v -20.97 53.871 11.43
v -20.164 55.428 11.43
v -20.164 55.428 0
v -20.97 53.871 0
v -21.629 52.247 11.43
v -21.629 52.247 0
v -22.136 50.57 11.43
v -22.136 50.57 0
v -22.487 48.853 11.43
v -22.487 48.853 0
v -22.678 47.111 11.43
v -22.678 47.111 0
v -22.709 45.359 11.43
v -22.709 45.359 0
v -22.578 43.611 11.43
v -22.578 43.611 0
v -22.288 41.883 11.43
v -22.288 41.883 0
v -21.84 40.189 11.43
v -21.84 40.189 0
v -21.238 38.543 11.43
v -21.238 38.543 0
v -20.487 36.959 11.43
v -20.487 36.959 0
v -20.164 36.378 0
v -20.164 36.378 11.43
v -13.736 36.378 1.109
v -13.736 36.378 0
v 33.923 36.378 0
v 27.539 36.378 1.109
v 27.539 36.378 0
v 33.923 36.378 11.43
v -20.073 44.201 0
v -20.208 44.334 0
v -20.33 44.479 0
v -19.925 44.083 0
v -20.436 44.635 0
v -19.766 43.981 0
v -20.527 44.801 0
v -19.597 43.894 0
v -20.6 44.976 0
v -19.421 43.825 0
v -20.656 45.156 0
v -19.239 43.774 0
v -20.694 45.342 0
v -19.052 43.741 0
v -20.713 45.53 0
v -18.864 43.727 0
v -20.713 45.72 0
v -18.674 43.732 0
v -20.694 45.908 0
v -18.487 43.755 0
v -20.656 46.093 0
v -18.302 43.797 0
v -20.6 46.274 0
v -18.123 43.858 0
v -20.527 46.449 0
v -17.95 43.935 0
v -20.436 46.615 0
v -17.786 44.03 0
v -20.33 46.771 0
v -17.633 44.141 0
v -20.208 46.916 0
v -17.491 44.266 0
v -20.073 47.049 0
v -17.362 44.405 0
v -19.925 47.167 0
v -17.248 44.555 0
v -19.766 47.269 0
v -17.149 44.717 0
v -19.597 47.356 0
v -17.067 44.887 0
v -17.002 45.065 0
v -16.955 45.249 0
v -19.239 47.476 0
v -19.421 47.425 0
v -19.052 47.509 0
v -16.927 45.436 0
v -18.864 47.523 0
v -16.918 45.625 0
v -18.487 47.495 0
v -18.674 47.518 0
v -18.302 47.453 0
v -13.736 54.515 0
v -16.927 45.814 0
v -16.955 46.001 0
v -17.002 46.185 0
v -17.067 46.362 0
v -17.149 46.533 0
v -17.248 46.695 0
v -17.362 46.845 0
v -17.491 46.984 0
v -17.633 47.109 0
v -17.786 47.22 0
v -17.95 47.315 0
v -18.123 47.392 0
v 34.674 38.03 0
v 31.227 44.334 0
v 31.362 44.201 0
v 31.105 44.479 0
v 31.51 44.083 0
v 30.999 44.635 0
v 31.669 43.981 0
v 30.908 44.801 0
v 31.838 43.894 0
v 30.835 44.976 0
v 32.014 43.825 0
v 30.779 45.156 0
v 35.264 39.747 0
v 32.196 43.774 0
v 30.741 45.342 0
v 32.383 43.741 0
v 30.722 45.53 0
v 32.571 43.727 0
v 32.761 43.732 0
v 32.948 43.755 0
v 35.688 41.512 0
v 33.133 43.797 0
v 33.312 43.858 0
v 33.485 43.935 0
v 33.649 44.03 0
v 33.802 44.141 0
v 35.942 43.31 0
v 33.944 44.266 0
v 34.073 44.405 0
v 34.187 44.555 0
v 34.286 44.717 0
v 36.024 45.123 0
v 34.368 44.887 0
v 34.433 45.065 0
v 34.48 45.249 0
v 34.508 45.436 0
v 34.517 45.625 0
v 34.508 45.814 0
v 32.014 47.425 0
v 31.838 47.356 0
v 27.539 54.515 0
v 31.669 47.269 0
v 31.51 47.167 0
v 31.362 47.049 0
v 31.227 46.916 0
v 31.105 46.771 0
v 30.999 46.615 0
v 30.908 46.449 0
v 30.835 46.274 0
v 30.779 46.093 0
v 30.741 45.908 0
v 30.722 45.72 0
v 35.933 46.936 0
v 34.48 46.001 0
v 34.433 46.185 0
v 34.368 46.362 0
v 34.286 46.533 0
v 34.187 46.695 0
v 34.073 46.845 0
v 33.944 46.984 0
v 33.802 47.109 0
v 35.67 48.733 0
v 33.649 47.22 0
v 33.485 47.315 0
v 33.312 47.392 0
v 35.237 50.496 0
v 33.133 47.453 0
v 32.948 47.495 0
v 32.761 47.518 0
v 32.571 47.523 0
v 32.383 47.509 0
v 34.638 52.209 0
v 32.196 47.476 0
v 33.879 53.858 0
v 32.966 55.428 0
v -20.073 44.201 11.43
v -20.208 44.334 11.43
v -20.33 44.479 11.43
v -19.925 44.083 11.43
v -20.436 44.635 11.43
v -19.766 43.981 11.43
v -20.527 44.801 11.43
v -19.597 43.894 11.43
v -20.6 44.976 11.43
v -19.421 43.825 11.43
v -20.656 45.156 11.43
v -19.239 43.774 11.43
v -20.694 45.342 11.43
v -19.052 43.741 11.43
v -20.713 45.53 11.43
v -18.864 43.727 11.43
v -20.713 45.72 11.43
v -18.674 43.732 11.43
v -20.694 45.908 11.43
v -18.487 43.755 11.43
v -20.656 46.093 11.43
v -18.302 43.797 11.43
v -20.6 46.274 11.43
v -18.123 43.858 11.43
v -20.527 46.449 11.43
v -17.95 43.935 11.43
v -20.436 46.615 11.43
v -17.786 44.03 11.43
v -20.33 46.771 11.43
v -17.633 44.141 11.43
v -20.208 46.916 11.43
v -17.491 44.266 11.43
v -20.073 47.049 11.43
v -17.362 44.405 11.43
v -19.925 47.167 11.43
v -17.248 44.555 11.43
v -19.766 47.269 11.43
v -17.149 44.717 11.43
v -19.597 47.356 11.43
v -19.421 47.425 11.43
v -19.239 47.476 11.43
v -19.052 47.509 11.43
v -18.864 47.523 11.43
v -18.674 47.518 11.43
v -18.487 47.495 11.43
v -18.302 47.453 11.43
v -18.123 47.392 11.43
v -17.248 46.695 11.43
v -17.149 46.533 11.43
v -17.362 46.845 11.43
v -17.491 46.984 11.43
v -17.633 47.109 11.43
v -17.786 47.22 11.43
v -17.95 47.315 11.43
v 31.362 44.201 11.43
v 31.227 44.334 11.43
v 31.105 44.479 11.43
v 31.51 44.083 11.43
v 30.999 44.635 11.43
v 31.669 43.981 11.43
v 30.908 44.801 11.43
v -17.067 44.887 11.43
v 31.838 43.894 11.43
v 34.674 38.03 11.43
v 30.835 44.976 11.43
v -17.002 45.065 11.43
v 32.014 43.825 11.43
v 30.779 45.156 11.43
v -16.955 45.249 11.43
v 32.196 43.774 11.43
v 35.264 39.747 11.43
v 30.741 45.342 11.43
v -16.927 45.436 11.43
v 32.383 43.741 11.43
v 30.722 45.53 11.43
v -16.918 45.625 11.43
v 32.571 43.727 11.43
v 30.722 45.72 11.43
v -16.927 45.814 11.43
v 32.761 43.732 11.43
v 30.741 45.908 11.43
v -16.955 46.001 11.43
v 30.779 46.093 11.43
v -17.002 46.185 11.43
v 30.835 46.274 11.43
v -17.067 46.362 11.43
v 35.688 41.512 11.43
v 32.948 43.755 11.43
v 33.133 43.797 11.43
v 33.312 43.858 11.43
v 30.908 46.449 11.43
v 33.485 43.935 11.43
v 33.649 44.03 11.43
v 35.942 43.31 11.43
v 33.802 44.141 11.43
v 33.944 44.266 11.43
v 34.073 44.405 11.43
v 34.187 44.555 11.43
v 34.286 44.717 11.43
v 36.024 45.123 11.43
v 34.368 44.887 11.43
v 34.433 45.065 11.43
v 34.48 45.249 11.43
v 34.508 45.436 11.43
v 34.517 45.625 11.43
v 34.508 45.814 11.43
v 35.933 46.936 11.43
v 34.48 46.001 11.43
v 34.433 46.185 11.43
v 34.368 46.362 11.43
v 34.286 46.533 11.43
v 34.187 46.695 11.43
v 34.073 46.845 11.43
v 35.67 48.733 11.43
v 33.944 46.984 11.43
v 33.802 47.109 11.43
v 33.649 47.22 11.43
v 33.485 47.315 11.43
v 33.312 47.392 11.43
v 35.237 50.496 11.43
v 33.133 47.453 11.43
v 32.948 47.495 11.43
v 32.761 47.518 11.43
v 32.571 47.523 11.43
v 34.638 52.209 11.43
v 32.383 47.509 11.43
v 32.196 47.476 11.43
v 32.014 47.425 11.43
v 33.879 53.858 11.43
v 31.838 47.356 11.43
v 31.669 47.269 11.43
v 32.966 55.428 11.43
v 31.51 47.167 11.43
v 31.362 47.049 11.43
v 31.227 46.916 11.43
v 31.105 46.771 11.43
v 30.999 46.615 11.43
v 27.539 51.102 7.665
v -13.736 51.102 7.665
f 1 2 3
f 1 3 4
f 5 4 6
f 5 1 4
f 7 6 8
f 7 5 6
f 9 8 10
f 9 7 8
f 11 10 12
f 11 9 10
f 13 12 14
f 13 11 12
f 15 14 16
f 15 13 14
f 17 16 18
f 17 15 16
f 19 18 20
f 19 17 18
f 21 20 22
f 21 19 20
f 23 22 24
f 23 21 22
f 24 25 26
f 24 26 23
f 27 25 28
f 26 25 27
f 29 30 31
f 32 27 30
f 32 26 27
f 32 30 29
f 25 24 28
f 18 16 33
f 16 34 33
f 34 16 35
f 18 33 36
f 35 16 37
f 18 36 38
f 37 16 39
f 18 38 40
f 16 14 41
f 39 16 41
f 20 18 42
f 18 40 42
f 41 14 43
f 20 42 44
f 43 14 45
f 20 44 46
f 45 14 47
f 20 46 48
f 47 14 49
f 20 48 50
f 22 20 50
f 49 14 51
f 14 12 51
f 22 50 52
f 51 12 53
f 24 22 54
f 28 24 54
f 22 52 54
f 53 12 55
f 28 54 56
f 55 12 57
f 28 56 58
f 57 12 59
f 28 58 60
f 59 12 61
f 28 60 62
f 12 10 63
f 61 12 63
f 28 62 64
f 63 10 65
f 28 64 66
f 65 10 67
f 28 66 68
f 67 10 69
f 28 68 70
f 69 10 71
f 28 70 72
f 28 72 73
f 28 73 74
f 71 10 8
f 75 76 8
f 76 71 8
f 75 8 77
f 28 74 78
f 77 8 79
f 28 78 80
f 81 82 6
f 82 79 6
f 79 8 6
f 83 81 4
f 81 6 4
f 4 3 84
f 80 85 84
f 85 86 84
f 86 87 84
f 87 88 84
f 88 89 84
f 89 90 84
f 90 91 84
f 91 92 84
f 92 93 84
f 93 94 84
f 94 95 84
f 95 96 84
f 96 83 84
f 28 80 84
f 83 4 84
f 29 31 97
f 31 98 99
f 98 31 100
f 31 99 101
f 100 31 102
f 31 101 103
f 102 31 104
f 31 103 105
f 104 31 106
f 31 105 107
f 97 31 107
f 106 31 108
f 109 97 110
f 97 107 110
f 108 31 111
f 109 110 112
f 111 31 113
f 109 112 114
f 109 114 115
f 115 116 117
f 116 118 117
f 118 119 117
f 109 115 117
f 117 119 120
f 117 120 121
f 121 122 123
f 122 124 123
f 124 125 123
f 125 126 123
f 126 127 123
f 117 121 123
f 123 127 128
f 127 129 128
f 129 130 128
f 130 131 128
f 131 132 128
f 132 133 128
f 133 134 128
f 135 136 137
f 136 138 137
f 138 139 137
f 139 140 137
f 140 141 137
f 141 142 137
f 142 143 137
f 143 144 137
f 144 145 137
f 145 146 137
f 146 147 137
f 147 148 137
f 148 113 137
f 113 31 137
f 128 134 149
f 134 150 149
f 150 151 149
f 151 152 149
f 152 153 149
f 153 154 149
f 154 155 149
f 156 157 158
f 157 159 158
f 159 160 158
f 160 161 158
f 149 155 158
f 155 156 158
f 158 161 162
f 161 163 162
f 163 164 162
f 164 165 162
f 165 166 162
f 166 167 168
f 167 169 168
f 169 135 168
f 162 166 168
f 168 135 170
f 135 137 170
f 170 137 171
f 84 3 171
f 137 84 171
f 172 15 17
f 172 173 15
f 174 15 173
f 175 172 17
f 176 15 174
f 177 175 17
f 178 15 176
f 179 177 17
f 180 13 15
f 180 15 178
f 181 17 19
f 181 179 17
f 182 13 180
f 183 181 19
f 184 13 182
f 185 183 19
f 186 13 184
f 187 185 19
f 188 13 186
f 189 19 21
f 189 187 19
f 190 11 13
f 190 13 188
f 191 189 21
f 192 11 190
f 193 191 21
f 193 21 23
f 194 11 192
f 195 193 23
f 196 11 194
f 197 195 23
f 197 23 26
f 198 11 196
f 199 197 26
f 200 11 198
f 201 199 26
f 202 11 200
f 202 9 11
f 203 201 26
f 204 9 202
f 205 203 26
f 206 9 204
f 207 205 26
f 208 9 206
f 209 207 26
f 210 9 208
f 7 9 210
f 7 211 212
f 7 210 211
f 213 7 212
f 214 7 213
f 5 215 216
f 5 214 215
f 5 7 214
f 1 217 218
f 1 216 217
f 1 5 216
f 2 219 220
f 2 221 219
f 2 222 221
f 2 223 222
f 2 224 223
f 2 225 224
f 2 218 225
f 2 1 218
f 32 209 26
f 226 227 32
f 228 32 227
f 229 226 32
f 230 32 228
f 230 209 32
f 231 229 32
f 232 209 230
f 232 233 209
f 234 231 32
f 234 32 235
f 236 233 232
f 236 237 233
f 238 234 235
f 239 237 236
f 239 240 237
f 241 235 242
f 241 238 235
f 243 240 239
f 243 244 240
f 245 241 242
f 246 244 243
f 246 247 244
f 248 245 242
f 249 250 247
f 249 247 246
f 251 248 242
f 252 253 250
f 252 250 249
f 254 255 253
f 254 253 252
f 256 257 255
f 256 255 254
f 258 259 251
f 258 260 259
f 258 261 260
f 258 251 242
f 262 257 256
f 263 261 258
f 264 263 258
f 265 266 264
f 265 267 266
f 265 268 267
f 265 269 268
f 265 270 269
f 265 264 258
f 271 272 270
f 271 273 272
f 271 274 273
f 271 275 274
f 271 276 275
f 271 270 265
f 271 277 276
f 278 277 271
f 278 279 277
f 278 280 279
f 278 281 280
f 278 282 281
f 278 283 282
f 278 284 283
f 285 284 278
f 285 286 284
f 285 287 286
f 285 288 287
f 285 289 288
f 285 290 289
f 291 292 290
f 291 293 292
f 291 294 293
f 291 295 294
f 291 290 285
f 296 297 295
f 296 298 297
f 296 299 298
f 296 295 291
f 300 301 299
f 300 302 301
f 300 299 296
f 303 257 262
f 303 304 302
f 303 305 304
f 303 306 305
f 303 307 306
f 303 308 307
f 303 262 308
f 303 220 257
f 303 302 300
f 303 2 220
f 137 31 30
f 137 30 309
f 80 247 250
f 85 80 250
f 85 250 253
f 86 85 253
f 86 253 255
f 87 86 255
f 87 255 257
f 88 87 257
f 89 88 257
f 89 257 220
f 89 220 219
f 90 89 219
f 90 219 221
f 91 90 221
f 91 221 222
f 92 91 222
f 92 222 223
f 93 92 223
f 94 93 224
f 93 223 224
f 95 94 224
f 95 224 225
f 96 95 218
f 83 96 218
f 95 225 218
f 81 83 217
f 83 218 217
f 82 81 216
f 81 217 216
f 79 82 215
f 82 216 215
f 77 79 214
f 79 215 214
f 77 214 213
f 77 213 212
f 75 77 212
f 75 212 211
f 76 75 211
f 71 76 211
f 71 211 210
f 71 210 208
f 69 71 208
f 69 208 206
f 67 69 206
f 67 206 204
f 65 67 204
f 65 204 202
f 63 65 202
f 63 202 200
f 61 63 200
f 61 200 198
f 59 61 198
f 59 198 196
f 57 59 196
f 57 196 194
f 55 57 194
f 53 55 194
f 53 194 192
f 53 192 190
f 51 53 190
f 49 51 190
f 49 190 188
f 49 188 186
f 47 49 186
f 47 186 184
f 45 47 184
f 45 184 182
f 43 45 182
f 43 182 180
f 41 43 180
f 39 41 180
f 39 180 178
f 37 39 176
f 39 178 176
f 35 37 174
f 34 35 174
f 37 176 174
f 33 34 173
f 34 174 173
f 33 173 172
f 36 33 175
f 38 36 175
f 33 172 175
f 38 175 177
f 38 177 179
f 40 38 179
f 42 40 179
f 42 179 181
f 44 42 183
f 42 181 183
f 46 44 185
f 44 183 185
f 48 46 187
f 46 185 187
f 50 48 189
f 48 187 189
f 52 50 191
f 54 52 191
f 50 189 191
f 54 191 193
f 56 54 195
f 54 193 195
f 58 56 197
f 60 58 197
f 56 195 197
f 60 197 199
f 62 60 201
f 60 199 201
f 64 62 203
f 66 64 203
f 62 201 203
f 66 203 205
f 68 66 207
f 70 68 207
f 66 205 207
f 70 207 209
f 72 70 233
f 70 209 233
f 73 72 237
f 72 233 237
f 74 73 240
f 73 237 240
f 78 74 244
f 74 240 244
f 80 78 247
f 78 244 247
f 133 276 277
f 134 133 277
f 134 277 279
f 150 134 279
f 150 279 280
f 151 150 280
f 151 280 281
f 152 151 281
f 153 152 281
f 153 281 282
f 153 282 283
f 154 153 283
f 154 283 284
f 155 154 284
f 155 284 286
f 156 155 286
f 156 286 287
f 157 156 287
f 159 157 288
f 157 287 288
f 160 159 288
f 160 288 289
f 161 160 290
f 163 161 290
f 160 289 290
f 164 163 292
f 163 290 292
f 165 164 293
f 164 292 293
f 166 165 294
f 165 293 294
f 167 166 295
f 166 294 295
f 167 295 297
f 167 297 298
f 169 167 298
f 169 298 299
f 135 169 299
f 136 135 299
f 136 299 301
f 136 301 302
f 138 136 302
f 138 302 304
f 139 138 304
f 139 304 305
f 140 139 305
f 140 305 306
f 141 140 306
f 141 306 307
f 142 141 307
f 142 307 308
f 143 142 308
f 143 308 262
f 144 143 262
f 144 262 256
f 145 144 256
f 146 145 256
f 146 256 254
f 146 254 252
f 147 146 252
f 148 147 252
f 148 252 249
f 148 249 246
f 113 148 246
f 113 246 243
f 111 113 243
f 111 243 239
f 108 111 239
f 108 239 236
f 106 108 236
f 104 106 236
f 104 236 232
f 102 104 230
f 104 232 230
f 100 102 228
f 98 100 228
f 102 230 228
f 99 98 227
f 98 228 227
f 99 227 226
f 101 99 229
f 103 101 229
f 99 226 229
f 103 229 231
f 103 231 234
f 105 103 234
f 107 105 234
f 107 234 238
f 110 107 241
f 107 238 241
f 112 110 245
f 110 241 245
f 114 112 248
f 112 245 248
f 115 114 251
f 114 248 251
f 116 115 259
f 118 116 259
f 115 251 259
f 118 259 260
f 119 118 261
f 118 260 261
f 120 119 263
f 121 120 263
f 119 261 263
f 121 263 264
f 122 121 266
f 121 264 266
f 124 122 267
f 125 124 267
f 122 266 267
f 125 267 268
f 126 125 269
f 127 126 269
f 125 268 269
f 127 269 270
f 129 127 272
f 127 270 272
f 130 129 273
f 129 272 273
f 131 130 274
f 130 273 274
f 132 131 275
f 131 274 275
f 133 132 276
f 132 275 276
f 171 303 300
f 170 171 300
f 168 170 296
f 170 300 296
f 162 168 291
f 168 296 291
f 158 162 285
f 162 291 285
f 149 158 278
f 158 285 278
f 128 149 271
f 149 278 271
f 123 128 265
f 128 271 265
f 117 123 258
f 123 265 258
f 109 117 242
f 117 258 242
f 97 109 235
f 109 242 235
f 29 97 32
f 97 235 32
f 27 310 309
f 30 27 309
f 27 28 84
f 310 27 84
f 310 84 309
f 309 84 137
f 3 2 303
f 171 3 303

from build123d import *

# Parameters (mm, degrees)
SKETCH1_R             = 66.4845
BOSS_EXTRUDE1_DEPTH   = 11.43
CUT_EXTRUDE1_START    = -33.02
SKETCH3_W             = 41.275
SKETCH3_H             = 24.257
CUT_EXTRUDE1_DEPTH    = 46.278900076
SKETCH4_R             = 30.1625
CUT_EXTRUDE2_DEPTH    = 95.715481208
F_6_CLEARANCE_HOLE1_D = 3.7973
CIRPATTERN1_COUNT     = 5
CUT_EXTRUDE3_DEPTH    = 95.715481208
SKETCH9_W             = 90.169443187
SKETCH9_H             = 19.134747519
CUT_EXTRUDE4_DEPTH    = 82.281975988
CUT_EXTRUDE5_DEPTH    = 73.517528625


with BuildPart() as part:
    # Sketch1 → Boss-Extrude1 (new body)
    with BuildSketch(Plane.XY):
        Circle(SKETCH1_R)
    extrude(amount=BOSS_EXTRUDE1_DEPTH)

    # Sketch3 → Cut-Extrude1 (cut)
    with BuildSketch(Plane(origin=(0, 10.998843101, -24.703806075), x_dir=(1, 0, 0), z_dir=(0, -0.40673664307580104, 0.9135454576426005)).offset(CUT_EXTRUDE1_START)):
        with Locations((6.90118, 37.673412979)):
            Rectangle(SKETCH3_W, SKETCH3_H)
    cut_extrude1 = extrude(amount=CUT_EXTRUDE1_DEPTH, mode=Mode.SUBTRACT)

    # Sketch4 → Cut-Extrude2 (cut, through all)
    with BuildSketch(Plane(origin=(0, 0, 0), x_dir=(-1, 0, 0), z_dir=(0, 0, -1))):
        Circle(SKETCH4_R)
    extrude(amount=-CUT_EXTRUDE2_DEPTH, mode=Mode.SUBTRACT)

    # #6 Clearance Hole1 (through all)
    with Locations(Plane(origin=(0, 0, 0), x_dir=(-1, 0, 0), z_dir=(0, 0, -1))):
        with Locations((-32.61868, 45.624980685), (18.81632, 45.624980685)):
            f_6_clearance_hole1 = Hole(F_6_CLEARANCE_HOLE1_D / 2)

    # CirPattern1: Cut-Extrude1, #6 Clearance Hole1 ×5 about axis
    cirpattern1_axis = Axis((0, 0, 0), (0, 0, 1))
    add([cut_extrude1.rotate(cirpattern1_axis, i * 360 / CIRPATTERN1_COUNT) for i in range(1, CIRPATTERN1_COUNT)], mode=Mode.SUBTRACT)
    add([f_6_clearance_hole1.rotate(cirpattern1_axis, i * 360 / CIRPATTERN1_COUNT) for i in range(1, CIRPATTERN1_COUNT)], mode=Mode.SUBTRACT)

    # Sketch5 → Cut-Extrude3 (cut, through all)
    with BuildSketch(Plane(origin=(0, 0, 0), x_dir=(-1, 0, 0), z_dir=(0, 0, -1))):
        with BuildLine():
            Line((-45.34231997, 48.623685175), (0, 0))
            Line((0, 0), (32.232325197, 58.148653919))
            ThreePointArc((32.232325197, 58.148653919), (8.102422362, -65.988934619), (-45.34231997, 48.623685175))
        make_face()
    extrude(amount=-CUT_EXTRUDE3_DEPTH, mode=Mode.SUBTRACT)

    # Sketch9 → Cut-Extrude4 (cut, through all)
    with BuildSketch(Plane.XY.offset(11.43)):
        Polygon((-20.16444413, 36.377620169), (33.922679606, 36.377620169), (0, 0), align=None)
        with Locations((9.105457651, 64.994993929)):
            Rectangle(SKETCH9_W, SKETCH9_H)
    extrude(amount=-CUT_EXTRUDE4_DEPTH, mode=Mode.SUBTRACT)

    # Sketch10 → Cut-Extrude5 (cut, through all)
    with BuildSketch(Plane.XY.offset(11.43)):
        with BuildLine():
            Line((-20.16444413, 36.377620169), (-37.32827131, 36.377620169))
            Line((-37.32827131, 36.377620169), (-35.716510793, 61.307238028))
            Line((-35.716510793, 61.307238028), (-20.16444413, 55.427620169))
            ThreePointArc((-20.16444413, 55.427620169), (-22.716660188, 45.902620169), (-20.16444413, 36.377620169))
        make_face()
        with BuildLine():
            Line((33.922679606, 36.377620169), (47.375187835, 33.198791646))
            Line((47.375187835, 33.198791646), (54.157749271, 61.901964171))
            Line((54.157749271, 61.901964171), (32.96596662, 55.427620169))
            ThreePointArc((32.96596662, 55.427620169), (36.00025444, 46.03098199), (33.922679606, 36.377620169))
        make_face()
    extrude(amount=-CUT_EXTRUDE5_DEPTH, mode=Mode.SUBTRACT)


solid = part.part
